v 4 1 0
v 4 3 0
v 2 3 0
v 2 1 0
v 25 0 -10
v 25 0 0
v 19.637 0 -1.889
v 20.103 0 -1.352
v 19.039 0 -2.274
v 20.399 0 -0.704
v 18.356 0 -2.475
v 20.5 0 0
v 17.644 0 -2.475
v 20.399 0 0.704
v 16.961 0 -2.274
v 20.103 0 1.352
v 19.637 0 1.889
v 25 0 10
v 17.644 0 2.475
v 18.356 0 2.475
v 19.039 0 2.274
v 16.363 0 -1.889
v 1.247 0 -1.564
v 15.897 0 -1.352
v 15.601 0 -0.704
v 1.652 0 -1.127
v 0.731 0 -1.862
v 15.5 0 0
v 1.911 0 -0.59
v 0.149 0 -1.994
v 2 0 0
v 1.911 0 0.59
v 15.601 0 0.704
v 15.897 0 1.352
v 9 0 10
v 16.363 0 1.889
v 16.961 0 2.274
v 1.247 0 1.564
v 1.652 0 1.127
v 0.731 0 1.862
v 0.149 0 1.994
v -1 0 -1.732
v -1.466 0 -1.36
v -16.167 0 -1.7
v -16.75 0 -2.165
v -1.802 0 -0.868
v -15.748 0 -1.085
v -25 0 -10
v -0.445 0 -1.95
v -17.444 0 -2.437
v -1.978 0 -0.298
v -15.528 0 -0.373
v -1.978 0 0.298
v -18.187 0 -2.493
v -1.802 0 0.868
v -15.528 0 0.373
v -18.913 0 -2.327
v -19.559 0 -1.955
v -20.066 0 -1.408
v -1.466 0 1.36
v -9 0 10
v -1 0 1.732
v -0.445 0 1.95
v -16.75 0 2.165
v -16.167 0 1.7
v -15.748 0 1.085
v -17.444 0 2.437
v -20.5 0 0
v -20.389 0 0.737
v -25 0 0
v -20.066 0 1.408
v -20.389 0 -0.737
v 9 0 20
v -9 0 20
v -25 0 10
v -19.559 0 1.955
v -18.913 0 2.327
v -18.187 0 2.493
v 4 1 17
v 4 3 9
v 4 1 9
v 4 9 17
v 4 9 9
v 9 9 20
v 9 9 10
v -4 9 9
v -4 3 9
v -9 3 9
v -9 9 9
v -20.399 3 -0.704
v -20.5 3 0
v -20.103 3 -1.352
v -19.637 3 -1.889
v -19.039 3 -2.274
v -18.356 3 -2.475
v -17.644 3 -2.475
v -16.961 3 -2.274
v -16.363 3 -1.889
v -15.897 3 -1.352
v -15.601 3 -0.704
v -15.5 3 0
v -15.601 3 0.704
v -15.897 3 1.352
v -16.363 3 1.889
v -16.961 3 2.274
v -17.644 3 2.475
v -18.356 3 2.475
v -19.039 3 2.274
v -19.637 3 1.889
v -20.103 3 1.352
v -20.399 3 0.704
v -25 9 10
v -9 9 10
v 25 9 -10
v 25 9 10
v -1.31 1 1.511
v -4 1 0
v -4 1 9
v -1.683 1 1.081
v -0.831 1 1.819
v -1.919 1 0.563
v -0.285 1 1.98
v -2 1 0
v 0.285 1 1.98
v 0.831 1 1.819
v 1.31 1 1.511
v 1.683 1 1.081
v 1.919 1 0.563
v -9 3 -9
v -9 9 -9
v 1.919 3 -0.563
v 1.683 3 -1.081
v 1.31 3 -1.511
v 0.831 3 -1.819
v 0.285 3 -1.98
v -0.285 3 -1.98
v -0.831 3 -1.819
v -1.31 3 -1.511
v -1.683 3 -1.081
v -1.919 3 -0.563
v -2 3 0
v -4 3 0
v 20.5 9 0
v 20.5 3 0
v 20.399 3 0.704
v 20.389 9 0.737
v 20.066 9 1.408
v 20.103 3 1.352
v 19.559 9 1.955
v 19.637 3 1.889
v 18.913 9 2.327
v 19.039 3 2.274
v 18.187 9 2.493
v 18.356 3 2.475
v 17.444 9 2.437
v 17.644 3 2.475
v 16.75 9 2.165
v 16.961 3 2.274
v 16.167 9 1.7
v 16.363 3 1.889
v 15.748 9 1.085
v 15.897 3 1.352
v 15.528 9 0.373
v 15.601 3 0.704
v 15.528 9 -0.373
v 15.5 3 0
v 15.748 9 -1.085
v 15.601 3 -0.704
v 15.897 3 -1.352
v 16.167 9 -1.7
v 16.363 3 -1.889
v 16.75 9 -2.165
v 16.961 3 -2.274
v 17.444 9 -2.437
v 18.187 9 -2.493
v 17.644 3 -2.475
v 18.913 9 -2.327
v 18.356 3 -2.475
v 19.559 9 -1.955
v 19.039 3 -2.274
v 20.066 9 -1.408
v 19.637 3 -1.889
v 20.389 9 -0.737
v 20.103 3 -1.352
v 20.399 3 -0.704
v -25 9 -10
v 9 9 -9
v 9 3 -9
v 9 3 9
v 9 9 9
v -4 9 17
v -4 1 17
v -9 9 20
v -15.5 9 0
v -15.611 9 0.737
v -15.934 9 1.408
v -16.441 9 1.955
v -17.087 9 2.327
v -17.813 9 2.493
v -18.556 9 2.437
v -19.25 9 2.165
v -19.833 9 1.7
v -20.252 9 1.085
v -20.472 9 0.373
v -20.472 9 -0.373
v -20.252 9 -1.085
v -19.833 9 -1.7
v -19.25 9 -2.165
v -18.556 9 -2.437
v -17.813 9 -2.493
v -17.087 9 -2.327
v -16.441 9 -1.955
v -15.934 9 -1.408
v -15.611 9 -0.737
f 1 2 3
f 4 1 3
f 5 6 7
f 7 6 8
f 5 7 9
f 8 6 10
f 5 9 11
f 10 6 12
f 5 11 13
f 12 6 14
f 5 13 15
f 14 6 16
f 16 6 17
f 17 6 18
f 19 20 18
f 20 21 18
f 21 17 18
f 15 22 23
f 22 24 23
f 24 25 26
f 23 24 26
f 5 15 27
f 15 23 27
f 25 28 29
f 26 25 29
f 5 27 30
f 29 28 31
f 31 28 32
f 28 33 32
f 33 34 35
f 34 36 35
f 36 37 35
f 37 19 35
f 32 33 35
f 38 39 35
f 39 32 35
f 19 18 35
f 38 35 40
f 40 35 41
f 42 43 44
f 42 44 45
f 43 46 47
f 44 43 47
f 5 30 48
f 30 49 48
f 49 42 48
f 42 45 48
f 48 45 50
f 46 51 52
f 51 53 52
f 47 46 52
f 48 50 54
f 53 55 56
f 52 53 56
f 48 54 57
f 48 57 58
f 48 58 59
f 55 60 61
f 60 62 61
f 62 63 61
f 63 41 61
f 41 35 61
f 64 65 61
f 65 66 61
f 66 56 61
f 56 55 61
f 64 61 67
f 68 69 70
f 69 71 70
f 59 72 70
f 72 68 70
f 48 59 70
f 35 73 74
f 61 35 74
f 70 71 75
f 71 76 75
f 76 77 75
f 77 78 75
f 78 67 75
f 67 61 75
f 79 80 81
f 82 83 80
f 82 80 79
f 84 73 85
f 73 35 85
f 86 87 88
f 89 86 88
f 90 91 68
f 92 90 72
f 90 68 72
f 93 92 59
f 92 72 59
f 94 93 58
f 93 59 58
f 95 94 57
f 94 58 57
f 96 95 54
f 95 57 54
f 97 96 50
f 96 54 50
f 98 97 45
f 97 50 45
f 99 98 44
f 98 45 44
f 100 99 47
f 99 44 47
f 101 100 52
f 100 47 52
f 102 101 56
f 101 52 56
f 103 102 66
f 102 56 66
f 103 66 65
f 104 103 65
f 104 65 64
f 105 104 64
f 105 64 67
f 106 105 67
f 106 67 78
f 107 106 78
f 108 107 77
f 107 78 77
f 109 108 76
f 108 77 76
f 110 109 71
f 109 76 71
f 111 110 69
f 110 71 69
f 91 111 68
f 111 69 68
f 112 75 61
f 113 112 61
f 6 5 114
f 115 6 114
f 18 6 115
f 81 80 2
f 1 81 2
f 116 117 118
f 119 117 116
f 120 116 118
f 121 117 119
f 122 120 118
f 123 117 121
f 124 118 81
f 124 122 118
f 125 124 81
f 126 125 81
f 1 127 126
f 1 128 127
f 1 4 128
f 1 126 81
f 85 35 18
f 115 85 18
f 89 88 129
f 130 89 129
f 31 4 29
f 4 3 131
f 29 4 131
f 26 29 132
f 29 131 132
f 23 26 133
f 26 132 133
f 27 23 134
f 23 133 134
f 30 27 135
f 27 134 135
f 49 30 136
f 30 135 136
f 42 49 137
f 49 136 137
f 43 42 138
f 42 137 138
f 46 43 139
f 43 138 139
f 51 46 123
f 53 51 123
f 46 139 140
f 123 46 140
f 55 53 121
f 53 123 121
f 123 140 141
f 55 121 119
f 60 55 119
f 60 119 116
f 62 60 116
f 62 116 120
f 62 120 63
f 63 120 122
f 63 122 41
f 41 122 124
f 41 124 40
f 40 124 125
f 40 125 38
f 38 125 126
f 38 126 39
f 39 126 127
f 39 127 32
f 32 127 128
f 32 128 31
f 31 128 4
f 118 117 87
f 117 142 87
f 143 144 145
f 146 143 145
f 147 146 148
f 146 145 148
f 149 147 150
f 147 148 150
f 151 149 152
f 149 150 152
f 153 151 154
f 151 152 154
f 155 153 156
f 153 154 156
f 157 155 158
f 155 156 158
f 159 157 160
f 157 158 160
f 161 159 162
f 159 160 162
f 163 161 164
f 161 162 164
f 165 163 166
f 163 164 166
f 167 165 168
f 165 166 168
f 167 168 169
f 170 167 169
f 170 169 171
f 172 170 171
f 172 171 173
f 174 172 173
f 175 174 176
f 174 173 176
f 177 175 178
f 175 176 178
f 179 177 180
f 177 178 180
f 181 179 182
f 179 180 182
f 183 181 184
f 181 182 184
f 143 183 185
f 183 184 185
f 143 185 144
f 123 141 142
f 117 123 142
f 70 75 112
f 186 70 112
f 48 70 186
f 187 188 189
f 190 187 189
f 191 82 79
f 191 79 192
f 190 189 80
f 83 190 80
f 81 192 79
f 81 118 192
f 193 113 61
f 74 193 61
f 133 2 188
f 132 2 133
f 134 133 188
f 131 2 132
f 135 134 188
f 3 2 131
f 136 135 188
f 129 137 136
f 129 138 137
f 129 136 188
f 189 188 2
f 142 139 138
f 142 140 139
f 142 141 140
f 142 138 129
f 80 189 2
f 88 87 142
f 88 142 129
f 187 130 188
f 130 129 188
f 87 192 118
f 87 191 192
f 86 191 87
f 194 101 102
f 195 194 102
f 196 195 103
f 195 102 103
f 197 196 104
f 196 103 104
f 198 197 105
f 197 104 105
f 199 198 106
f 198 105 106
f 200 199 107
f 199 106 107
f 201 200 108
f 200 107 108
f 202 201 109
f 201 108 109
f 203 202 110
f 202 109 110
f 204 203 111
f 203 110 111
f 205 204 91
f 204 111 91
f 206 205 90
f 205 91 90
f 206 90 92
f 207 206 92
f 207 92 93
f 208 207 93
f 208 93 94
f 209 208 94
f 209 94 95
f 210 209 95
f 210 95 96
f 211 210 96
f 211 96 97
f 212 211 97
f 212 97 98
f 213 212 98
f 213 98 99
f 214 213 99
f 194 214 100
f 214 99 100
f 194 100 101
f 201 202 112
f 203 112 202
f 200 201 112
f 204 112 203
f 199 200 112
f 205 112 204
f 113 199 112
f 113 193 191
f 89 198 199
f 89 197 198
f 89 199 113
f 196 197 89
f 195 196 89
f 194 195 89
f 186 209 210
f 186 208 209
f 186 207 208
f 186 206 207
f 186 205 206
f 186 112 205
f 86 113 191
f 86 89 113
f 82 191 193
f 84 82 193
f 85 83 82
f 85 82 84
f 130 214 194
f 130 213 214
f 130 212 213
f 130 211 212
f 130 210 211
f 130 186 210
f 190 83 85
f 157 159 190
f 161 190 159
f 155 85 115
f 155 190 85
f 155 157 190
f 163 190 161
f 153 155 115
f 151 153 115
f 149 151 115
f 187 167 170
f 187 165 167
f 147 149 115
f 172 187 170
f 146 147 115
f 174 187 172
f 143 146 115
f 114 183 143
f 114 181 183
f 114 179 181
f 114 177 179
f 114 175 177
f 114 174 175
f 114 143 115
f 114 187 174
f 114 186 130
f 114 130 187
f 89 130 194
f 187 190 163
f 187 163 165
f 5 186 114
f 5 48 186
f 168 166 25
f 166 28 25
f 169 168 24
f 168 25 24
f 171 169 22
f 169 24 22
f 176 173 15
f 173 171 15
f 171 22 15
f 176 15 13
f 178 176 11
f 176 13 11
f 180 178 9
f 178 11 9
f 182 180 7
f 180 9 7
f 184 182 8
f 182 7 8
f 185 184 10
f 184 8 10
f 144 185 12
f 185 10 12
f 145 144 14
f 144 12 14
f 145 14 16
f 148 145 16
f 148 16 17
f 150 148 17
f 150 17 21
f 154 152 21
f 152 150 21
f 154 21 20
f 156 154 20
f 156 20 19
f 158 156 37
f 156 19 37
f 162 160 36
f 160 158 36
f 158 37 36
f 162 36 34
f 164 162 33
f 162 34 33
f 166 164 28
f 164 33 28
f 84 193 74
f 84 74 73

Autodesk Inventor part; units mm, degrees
ref_plane "YZ Plane" through (0, 0, 0) normal (1, 0, 0) x (0, 1, 0)
ref_plane "XZ Plane" through (0, 0, 0) normal (0, 1, 0) x (-1, 0, 0)
ref_plane "XY Plane" through (0, 0, 0) normal (0, 0, 1) x (1, 0, 0)
sketch "Sketch1" plane through (0, 0, 0) normal (0, 1, 0) x (-1, 0, 0)
  line L0 (9, 9) -> (-9, 9)
  line L1 (-9, 9) -> (-9, -9)
  line L2 (-9, -9) -> (9, -9)
  line L3 (9, -9) -> (9, 9)
  line L4 (9, 9) -> (-9, -9) construction
  line L5 (-9, 9) -> (9, -9) construction
  line L6 (25, 10) -> (-25, 10)
  line L7 (-25, 10) -> (-25, -10)
  line L8 (-25, -10) -> (25, -10)
  line L9 (25, -10) -> (25, 10)
  line L10 (25, 10) -> (-25, -10) construction
  line L11 (-25, 10) -> (25, -10) construction
  line L12 (25, 0) -> (18, 0)
  line L13 (-25, 0) -> (-18, 0)
  circle A0 centre (18, 0) radius 2.5
  circle A1 centre (-18, 0) radius 2.5
  point P0 (0, 0)
  dimension "d0" = 18
  dimension "d1" = 18
  dimension "d2" = 50
  dimension "d3" = 20
  dimension "d4" = 7
  dimension "d5" = 5
  dimension "d6" = 5
extrude "Extrusion1" add sketch "Sketch1" along normal blind 3 contours L3 L2 L1 L0 | L9 L8 L7 L6
sketch "Sketch2" plane through (0, 3, 0) normal (0, 1, 0) x (1, 0, 0)
  line L0 (-9, 9) -> (9, 9)
  line L1 (9, 9) -> (9, -9)
  line L2 (9, -9) -> (-9, -9)
  line L3 (-9, -9) -> (-9, 9)
  line L4 (-9, 9) -> (9, -9) construction
  line L5 (9, 9) -> (-9, -9) construction
  circle A0 centre (-18, 0) radius 2.5
  circle A1 centre (18, 0) radius 2.5
  line L6 (-25, -10) -> (25, -10) projected
  line L7 (-25, 10) -> (25, 10)
  line L8 (25, 10) -> (25, -10)
  line L9 (25, -10) -> (-25, -10)
  line L10 (-25, -10) -> (-25, 10)
  line L11 (-25, 10) -> (25, -10) construction
  line L12 (25, 10) -> (-25, -10) construction
  point P0 (0, 0)
  dimension "d9" = 18
  dimension "d10" = 18
extrude "Extrusion2" add sketch "Sketch2" along normal blind 6
sketch "Sketch3" plane through (-25, 0, 10) normal (0, 0, 1) x (1, 0, 0)
  line L0 (34, 3) -> (34, 9) projected
  line L1 (16, -9) -> (34, -9)
  line L2 (34, -9) -> (34, 9)
  line L3 (34, 9) -> (16, 9)
  line L4 (16, 9) -> (16, -9)
  line L5 (16, -9) -> (34, 9) construction
  line L6 (34, -9) -> (16, 9) construction
  line L7 (16, 0) -> (34, 0)
  point P0 (25, 0)
extrude "Extrusion3" add sketch "Sketch3" along normal blind 10 contours L2 L7 L4 L3 L0
sketch "Sketch4" plane through (0, 9, 0) normal (0, 1, 0) x (1, 0, 0)
  line L0 (-9, -9) -> (9, -9) projected
  line L1 (0, -9) -> (0, -13)
  line L2 (4, -17) -> (-4, -17)
  line L3 (-4, -17) -> (-4, -9)
  line L4 (-4, -9) -> (4, -9)
  line L5 (4, -9) -> (4, -17)
  line L6 (4, -17) -> (-4, -9) construction
  line L7 (-4, -17) -> (4, -9) construction
  point P0 (0, 0)
  dimension "d15" = 4
  dimension "d16" = 8
extrude "Extrusion4" cut sketch "Sketch4" against normal blind 8
sketch "Sketch5" plane through (0, 3, 0) normal (0, 1, 0) x (1, 0, 0)
  line L0 (-4, -9) -> (4, -9) projected
  line L1 (0, -9) -> (0, -6)
  line L2 (0, -6) -> (-4, -6)
  line L3 (-4, -6) -> (-4, -9)
  line L4 (-4, -9) -> (0, -9)
  line L5 (0, -9) -> (0, -6)
  line L6 (0, -6) -> (4, -6)
  line L7 (4, -6) -> (4, -9)
  line L8 (4, -9) -> (0, -9)
  line L9 (0, -9) -> (0, -6)
  line L10 (-4, -6) -> (4, -6)
  line L11 (4, -6) -> (4, 0)
  line L12 (4, 0) -> (-4, 0)
  line L13 (-4, 0) -> (-4, -6)
  point P0 (0, 0)
  dimension "d19" = 3
extrude "Extrusion5" cut sketch "Sketch5" against normal blind 2
sketch "Sketch6" plane through (0, 3, 0) normal (0, 1, 0) x (1, 0, 0)
  circle A0 centre (0, 0) radius 2
  dimension "d22" = 4
extrude "Extrusion6" cut sketch "Sketch6" against normal through all
properties part number "gps_holder"
